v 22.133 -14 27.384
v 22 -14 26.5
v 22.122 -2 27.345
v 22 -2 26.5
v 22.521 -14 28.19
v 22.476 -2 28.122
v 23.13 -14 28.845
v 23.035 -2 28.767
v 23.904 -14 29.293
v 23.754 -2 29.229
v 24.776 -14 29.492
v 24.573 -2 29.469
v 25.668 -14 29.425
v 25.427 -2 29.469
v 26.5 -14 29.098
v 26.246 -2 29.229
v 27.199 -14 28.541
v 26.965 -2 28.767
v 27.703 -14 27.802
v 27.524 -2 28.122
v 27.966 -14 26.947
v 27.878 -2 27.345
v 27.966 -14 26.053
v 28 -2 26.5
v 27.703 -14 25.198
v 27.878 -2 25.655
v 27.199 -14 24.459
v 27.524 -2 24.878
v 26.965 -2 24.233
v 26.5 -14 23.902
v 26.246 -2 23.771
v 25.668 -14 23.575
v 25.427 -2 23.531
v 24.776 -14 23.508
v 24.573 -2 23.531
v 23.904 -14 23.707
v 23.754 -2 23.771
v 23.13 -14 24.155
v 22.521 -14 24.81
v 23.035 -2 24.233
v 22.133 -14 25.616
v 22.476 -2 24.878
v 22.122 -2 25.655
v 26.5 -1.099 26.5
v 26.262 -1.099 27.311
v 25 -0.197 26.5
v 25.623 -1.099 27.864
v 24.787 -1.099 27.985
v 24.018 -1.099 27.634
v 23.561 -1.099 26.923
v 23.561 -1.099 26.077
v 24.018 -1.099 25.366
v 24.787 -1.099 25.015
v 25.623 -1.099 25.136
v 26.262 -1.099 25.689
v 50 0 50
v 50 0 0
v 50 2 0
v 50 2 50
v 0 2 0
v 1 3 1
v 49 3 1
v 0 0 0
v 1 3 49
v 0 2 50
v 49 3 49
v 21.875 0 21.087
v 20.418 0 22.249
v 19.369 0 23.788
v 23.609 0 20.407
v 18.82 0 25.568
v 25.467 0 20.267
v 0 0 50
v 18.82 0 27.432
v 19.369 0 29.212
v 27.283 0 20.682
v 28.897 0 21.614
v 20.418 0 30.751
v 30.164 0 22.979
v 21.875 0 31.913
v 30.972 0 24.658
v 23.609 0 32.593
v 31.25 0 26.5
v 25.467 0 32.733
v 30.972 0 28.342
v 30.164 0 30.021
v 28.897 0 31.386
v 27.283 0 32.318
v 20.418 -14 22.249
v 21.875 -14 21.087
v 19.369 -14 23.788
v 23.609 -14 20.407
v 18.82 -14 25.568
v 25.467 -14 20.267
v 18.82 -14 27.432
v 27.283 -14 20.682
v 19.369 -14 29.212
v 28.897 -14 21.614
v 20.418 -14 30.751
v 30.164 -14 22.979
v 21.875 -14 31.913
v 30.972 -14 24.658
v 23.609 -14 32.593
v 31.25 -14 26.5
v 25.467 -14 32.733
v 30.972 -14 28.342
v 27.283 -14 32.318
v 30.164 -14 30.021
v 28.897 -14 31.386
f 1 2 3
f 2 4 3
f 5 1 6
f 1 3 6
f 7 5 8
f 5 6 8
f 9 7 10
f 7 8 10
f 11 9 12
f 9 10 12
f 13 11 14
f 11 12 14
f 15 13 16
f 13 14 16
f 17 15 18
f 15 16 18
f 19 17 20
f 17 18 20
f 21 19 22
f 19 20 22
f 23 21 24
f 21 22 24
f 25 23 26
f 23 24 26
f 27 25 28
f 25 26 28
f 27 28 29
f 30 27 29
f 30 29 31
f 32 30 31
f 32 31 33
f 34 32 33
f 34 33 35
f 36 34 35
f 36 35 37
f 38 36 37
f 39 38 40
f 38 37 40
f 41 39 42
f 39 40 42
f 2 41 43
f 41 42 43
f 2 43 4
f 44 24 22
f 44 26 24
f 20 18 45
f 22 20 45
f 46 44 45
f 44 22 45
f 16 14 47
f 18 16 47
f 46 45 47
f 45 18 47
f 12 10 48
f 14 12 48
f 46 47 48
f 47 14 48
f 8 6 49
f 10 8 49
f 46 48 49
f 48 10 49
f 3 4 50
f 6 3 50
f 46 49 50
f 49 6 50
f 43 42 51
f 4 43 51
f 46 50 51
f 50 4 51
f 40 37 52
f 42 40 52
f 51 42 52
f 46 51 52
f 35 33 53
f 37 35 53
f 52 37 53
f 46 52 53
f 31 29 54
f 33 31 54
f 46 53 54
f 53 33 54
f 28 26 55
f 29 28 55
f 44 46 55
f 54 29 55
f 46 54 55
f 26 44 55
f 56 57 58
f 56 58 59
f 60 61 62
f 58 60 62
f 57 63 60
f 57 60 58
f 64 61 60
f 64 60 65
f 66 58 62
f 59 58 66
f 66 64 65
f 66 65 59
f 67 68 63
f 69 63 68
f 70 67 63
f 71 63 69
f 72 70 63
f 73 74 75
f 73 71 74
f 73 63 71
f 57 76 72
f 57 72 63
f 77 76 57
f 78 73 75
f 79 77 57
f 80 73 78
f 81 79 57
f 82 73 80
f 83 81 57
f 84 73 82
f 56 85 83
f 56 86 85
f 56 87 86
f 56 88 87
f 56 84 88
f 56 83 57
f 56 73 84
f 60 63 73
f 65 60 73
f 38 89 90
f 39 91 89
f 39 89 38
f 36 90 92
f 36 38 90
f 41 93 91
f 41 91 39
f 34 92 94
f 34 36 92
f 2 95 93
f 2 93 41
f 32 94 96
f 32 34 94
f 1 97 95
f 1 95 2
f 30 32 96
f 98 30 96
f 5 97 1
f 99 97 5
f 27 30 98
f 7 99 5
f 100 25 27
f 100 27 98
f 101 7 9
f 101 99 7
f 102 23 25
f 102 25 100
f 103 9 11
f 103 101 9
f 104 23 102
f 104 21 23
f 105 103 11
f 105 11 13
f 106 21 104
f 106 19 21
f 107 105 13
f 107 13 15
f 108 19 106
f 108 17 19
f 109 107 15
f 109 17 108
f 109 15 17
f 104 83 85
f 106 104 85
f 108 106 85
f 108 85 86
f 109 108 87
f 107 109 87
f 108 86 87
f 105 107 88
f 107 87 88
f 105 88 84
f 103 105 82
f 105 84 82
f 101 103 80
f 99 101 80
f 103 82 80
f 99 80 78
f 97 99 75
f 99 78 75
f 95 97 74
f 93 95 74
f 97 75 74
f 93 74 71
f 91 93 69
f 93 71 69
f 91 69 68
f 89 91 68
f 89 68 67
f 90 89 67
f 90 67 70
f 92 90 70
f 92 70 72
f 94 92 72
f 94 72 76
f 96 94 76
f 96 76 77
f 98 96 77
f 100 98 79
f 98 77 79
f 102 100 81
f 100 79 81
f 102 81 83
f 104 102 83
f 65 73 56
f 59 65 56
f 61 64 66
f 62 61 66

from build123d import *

# Parameters (mm, degrees)
F1_R     = 6.25
F2_DEPTH = 14
F0_W     = 50
F0_H     = 50
F3_DEPTH = 3
F5_D     = 6
F5_DEPTH = 12
F5_TIP   = 1.8025818571
F6_SIZE  = 1


with BuildPart() as f2:
    # F1 (on face) → F2 (new body)
    with BuildSketch(Plane.XZ):
        with Locations((25, 26.5)):
            Circle(F1_R)
    extrude(amount=F2_DEPTH)

    # F0 (on Front) → F3 (join)
    with BuildSketch(Plane.XZ):
        with Locations((25, 25)):
            Rectangle(F0_W, F0_H)
    extrude(amount=-F3_DEPTH)

    # F5
    with Locations(Plane.XZ.offset(14)):
        with Locations((25, 26.5)):
            Hole(F5_D / 2, depth=F5_DEPTH)
            with Locations((0, 0, -(F5_DEPTH + F5_TIP / 2))):  # 118° drill point
                Cone(0, F5_D / 2, F5_TIP, mode=Mode.SUBTRACT)

    # F6
    f6_edges = [f2.edges().sort_by_distance(p)[0] for p in [
        (25, 3, 50),
        (50, 3, 25),
        (0, 3, 25),
        (25, 3, 0),
    ]]
    chamfer(f6_edges, length=F6_SIZE)


solid = f2.part
